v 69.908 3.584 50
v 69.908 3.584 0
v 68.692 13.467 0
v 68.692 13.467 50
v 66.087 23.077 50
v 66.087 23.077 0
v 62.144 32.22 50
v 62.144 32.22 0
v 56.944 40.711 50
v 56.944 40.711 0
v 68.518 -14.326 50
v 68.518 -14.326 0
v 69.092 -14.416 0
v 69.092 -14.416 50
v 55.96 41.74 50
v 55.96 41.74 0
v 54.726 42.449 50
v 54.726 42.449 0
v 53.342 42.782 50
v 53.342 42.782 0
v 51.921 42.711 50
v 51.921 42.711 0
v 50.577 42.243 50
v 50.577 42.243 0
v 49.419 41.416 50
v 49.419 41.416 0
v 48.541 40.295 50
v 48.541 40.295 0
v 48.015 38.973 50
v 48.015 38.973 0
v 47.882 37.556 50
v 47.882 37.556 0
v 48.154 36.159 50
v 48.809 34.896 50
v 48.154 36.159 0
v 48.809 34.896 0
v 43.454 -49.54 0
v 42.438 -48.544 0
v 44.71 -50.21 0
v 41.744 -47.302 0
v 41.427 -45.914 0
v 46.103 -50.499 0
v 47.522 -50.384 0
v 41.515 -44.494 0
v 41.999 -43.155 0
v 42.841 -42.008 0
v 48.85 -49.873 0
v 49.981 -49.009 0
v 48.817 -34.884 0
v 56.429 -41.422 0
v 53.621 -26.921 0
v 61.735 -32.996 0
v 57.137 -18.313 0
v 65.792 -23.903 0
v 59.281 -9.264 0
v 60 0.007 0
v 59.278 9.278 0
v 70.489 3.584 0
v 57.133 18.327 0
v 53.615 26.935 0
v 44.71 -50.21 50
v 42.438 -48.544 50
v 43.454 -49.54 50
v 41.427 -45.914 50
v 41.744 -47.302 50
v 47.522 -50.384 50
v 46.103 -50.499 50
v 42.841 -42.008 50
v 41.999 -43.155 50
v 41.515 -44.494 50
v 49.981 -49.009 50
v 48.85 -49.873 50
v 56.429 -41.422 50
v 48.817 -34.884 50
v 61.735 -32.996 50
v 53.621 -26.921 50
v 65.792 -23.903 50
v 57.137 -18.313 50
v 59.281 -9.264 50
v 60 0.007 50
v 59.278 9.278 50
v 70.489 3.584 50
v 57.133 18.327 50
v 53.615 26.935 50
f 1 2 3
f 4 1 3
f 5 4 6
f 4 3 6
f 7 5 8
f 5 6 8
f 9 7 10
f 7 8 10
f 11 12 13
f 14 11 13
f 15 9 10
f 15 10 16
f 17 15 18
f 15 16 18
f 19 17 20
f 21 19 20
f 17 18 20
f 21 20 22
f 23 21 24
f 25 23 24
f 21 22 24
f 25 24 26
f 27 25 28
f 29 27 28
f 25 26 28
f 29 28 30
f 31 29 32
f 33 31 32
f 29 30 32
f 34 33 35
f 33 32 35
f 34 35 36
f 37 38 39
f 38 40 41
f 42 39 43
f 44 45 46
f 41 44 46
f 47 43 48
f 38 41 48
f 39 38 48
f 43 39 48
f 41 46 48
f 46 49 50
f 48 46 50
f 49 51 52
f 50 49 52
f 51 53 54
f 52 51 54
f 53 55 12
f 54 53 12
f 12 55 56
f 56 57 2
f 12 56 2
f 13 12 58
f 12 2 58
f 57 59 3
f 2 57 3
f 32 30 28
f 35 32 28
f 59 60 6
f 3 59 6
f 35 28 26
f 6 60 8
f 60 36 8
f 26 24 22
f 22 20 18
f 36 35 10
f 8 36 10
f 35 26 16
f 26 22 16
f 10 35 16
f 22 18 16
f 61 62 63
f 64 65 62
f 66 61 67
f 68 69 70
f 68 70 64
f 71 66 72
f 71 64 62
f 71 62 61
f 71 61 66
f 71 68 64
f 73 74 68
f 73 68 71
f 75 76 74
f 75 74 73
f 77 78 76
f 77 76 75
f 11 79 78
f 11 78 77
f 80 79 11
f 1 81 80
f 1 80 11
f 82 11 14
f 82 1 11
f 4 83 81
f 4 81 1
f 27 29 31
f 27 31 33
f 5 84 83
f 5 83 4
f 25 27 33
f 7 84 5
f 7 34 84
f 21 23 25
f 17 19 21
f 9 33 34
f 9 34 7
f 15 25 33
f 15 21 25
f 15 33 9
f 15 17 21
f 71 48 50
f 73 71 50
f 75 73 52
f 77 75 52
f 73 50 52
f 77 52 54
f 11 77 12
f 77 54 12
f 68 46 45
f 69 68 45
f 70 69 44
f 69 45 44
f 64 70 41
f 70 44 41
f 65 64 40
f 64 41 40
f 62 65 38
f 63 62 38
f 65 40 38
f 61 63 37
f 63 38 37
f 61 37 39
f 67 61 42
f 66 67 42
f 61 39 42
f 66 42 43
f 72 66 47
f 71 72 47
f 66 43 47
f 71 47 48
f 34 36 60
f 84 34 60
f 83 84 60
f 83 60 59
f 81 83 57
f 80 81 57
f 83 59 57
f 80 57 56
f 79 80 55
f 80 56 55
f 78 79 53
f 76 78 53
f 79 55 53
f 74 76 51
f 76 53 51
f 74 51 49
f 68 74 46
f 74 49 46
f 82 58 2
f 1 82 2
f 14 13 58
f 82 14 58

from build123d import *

# Parameters (mm, degrees)
BOSS_EXTRU_1_DEPTH = 50


with BuildPart() as part:
    # Esquisse1 → Boss.-Extru.1 (new body)
    with BuildSketch(Plane.XY):
        with BuildLine():
            Line((69.091744654, -14.415915473), (70.48859579, 3.584084527))
            Line((70.48859579, 3.584084527), (69.908185058, 3.584084527))
            ThreePointArc((69.908185058, 3.584084527), (66.086740028, 23.076888708), (56.943655444, 40.711424744))
            ThreePointArc((56.943655444, 40.711424744), (49.968292573, 41.870869794), (48.808847523, 34.895506923))
            ThreePointArc((48.808847523, 34.895506923), (59.820145904, -4.642213263), (42.84093319, -42.007790271))
            ThreePointArc((42.84093319, -42.007790271), (42.910361767, -49.078517226), (49.981088722, -49.009088649))
            ThreePointArc((49.981088722, -49.009088649), (61.735305745, -32.996242584), (68.518282775, -14.32637168))
            Line((68.518282775, -14.32637168), (69.091744654, -14.415915473))
        make_face()
    extrude(amount=BOSS_EXTRU_1_DEPTH)


solid = part.part
